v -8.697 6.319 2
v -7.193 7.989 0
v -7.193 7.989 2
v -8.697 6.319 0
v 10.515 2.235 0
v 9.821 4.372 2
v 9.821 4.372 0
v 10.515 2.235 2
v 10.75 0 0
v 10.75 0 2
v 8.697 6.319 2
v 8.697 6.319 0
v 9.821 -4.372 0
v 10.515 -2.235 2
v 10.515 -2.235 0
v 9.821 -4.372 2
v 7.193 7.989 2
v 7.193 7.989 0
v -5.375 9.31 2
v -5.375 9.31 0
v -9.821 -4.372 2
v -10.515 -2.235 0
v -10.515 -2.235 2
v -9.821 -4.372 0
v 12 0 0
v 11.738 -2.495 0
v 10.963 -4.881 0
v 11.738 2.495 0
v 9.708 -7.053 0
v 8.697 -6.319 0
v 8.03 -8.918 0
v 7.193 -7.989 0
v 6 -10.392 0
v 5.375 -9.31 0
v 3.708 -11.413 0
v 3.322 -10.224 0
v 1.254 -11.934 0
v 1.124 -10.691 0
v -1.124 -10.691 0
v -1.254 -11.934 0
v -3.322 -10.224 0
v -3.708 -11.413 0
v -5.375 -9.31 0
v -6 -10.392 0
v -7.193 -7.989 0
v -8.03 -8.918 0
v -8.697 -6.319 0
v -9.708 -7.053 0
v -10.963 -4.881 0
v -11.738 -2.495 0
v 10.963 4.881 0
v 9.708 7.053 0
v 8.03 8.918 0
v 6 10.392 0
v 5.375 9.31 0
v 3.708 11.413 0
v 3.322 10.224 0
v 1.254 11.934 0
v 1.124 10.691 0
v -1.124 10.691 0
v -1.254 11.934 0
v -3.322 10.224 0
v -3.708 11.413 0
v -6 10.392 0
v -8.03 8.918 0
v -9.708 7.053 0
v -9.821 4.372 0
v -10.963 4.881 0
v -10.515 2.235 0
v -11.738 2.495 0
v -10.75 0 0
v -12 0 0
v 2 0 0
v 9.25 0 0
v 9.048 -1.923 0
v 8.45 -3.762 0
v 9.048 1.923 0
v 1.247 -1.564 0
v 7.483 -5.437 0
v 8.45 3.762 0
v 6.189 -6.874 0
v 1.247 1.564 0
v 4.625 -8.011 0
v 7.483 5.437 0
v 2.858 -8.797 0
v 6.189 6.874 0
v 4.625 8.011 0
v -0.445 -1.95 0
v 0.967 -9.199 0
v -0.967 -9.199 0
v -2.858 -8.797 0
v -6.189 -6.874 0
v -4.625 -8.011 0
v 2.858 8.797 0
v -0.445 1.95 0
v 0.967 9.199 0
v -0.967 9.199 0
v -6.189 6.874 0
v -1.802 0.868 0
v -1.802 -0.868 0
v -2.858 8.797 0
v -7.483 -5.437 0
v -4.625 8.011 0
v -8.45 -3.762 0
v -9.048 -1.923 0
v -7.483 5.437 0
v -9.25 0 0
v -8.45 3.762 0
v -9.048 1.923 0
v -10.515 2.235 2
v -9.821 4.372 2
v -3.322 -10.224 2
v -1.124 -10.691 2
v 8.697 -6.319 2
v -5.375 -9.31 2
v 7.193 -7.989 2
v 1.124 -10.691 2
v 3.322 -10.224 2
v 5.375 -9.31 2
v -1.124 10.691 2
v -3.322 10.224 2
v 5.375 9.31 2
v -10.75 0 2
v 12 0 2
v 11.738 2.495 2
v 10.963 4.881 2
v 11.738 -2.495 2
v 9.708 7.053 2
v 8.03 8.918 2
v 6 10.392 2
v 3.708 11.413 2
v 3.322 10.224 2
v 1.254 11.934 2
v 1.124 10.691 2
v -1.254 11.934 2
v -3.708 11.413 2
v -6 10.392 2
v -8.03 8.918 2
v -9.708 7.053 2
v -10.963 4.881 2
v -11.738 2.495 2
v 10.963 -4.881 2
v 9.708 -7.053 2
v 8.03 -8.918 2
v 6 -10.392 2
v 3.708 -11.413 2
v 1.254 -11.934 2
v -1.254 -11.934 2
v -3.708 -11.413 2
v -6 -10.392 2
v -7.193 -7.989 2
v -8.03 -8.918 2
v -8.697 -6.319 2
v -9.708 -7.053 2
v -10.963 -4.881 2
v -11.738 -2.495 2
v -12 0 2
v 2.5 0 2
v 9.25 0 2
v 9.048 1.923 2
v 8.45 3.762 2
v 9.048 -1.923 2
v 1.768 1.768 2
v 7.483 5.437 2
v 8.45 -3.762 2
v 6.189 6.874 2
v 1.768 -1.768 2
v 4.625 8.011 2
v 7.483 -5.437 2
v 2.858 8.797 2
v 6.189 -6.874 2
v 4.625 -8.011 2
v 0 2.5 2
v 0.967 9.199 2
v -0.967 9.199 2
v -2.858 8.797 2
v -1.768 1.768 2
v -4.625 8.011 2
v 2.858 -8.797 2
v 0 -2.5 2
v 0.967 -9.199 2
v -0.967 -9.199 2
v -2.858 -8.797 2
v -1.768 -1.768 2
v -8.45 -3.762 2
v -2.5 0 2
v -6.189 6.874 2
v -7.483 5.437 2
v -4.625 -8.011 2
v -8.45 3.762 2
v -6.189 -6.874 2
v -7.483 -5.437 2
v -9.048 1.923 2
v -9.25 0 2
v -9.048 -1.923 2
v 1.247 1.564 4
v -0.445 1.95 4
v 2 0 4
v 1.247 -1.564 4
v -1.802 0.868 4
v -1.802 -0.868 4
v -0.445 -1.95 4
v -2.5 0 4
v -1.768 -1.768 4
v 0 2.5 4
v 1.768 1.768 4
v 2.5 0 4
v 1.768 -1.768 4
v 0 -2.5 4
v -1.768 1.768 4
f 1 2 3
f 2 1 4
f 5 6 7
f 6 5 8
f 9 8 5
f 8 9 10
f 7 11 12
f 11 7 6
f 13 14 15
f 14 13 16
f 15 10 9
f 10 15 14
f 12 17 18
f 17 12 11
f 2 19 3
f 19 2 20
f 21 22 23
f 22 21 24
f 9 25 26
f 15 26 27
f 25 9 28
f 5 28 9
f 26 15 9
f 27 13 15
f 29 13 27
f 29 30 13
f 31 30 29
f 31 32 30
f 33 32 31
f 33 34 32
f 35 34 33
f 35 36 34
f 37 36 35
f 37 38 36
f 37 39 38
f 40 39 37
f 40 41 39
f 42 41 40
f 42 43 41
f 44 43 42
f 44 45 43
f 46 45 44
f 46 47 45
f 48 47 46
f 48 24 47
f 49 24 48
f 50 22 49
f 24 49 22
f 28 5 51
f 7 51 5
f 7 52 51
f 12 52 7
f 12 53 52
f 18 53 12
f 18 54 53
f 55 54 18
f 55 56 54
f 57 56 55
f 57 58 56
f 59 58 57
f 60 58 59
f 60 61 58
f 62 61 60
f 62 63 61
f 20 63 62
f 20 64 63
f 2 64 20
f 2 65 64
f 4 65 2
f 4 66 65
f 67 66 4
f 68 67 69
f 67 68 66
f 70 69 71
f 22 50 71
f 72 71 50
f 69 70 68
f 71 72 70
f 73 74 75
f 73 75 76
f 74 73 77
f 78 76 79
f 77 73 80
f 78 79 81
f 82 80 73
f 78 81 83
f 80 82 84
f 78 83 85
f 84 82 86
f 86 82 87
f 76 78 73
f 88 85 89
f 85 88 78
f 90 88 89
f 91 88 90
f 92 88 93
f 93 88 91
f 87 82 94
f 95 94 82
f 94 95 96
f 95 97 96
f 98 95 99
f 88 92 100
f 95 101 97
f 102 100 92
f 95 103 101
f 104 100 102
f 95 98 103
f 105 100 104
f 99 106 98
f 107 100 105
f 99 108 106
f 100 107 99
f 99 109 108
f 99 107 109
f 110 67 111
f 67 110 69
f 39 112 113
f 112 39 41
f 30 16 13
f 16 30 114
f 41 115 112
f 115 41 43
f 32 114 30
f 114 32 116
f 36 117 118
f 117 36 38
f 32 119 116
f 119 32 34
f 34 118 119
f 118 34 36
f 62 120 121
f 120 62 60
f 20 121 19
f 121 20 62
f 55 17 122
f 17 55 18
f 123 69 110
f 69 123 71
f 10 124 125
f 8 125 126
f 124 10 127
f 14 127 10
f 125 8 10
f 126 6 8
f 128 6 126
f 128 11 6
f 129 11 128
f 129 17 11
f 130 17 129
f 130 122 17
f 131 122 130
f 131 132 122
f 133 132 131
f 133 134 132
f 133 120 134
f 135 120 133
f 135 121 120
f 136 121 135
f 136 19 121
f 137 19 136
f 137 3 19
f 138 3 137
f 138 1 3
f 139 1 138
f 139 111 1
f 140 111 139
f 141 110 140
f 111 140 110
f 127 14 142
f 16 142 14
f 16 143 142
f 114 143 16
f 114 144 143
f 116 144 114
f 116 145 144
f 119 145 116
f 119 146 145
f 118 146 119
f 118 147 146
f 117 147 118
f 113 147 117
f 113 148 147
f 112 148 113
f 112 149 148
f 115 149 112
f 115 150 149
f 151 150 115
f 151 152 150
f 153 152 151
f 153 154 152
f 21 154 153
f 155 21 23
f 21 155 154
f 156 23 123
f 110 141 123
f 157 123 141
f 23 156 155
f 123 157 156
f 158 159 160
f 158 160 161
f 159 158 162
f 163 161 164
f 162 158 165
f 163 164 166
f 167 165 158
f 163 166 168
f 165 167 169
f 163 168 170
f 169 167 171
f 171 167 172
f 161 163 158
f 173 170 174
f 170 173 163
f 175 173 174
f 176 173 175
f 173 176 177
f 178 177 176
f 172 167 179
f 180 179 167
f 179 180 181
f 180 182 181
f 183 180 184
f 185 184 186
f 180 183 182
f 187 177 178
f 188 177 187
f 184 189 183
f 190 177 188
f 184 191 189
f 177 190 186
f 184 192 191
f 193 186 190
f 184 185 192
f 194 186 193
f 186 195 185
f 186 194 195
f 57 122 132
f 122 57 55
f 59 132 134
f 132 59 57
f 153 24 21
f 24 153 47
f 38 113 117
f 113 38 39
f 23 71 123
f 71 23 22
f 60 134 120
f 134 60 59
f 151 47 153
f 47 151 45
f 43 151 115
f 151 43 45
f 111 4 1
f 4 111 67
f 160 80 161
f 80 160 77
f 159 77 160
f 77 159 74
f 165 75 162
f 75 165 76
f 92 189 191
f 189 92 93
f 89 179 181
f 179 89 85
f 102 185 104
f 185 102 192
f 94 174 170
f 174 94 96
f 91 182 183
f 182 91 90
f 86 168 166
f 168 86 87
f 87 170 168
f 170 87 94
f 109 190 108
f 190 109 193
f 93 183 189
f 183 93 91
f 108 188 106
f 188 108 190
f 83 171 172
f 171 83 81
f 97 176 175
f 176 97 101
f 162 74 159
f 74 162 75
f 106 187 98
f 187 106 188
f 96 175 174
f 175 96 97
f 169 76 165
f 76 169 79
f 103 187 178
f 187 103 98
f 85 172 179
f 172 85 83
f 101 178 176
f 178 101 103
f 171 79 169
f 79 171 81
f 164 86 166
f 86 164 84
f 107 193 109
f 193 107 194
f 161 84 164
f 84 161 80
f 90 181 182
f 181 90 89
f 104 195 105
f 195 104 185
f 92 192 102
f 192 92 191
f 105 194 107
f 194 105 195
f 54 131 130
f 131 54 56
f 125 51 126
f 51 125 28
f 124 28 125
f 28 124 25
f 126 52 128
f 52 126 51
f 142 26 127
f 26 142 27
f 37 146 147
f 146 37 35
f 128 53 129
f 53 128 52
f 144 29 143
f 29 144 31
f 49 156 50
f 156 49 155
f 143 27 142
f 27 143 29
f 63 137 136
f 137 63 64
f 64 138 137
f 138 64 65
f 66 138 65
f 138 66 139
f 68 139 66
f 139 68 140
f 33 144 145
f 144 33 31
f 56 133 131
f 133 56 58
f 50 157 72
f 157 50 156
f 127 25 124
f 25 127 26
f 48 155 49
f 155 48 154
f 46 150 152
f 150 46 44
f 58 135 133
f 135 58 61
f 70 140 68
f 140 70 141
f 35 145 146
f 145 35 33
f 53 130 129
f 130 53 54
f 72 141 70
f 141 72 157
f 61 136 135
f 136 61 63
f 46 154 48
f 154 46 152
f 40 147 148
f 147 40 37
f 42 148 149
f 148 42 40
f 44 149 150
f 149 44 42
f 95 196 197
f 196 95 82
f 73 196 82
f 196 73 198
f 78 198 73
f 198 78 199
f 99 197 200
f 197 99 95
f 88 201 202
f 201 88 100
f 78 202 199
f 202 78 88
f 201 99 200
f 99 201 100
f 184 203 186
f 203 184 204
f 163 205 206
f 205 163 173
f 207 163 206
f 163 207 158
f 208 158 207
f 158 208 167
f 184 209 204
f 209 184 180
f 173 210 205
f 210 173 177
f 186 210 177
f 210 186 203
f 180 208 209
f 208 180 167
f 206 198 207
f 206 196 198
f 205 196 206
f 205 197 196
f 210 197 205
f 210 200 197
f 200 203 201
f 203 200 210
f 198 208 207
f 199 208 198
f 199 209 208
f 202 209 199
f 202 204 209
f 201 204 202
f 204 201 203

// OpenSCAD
radius_lid = 20;
width_groove = 3;
height_groove = 2;
overhang_lid = 4;
thickness_lid = 2;

inner_radius_coffee_grinder = 4;
outer_radius_coffee_grinder = 4+1;
inner_height_coffee_grinder = 4;

//
difference(){
    cylinder(h=thickness_lid, d=radius_lid+overhang_lid);
    // Make a groove in the botto of the lid..
    difference(){
    cylinder(h=height_groove, d=radius_lid + width_groove / 2);
        cylinder(h=height_groove, d=radius_lid - width_groove / 2);
    }
    // Cutout the circle for the coffee grinder in the middle of the lid
    cylinder(h=10, d=inner_radius_coffee_grinder);
}
// Now add a cylinder on top of the cutout that acts as a mount for the coffee grinder
// (Only need to add some screw stuff)
 difference(){
    cylinder(h=inner_height_coffee_grinder, d=outer_radius_coffee_grinder);
    cylinder(h=inner_height_coffee_grinder, d=inner_radius_coffee_grinder);
}
